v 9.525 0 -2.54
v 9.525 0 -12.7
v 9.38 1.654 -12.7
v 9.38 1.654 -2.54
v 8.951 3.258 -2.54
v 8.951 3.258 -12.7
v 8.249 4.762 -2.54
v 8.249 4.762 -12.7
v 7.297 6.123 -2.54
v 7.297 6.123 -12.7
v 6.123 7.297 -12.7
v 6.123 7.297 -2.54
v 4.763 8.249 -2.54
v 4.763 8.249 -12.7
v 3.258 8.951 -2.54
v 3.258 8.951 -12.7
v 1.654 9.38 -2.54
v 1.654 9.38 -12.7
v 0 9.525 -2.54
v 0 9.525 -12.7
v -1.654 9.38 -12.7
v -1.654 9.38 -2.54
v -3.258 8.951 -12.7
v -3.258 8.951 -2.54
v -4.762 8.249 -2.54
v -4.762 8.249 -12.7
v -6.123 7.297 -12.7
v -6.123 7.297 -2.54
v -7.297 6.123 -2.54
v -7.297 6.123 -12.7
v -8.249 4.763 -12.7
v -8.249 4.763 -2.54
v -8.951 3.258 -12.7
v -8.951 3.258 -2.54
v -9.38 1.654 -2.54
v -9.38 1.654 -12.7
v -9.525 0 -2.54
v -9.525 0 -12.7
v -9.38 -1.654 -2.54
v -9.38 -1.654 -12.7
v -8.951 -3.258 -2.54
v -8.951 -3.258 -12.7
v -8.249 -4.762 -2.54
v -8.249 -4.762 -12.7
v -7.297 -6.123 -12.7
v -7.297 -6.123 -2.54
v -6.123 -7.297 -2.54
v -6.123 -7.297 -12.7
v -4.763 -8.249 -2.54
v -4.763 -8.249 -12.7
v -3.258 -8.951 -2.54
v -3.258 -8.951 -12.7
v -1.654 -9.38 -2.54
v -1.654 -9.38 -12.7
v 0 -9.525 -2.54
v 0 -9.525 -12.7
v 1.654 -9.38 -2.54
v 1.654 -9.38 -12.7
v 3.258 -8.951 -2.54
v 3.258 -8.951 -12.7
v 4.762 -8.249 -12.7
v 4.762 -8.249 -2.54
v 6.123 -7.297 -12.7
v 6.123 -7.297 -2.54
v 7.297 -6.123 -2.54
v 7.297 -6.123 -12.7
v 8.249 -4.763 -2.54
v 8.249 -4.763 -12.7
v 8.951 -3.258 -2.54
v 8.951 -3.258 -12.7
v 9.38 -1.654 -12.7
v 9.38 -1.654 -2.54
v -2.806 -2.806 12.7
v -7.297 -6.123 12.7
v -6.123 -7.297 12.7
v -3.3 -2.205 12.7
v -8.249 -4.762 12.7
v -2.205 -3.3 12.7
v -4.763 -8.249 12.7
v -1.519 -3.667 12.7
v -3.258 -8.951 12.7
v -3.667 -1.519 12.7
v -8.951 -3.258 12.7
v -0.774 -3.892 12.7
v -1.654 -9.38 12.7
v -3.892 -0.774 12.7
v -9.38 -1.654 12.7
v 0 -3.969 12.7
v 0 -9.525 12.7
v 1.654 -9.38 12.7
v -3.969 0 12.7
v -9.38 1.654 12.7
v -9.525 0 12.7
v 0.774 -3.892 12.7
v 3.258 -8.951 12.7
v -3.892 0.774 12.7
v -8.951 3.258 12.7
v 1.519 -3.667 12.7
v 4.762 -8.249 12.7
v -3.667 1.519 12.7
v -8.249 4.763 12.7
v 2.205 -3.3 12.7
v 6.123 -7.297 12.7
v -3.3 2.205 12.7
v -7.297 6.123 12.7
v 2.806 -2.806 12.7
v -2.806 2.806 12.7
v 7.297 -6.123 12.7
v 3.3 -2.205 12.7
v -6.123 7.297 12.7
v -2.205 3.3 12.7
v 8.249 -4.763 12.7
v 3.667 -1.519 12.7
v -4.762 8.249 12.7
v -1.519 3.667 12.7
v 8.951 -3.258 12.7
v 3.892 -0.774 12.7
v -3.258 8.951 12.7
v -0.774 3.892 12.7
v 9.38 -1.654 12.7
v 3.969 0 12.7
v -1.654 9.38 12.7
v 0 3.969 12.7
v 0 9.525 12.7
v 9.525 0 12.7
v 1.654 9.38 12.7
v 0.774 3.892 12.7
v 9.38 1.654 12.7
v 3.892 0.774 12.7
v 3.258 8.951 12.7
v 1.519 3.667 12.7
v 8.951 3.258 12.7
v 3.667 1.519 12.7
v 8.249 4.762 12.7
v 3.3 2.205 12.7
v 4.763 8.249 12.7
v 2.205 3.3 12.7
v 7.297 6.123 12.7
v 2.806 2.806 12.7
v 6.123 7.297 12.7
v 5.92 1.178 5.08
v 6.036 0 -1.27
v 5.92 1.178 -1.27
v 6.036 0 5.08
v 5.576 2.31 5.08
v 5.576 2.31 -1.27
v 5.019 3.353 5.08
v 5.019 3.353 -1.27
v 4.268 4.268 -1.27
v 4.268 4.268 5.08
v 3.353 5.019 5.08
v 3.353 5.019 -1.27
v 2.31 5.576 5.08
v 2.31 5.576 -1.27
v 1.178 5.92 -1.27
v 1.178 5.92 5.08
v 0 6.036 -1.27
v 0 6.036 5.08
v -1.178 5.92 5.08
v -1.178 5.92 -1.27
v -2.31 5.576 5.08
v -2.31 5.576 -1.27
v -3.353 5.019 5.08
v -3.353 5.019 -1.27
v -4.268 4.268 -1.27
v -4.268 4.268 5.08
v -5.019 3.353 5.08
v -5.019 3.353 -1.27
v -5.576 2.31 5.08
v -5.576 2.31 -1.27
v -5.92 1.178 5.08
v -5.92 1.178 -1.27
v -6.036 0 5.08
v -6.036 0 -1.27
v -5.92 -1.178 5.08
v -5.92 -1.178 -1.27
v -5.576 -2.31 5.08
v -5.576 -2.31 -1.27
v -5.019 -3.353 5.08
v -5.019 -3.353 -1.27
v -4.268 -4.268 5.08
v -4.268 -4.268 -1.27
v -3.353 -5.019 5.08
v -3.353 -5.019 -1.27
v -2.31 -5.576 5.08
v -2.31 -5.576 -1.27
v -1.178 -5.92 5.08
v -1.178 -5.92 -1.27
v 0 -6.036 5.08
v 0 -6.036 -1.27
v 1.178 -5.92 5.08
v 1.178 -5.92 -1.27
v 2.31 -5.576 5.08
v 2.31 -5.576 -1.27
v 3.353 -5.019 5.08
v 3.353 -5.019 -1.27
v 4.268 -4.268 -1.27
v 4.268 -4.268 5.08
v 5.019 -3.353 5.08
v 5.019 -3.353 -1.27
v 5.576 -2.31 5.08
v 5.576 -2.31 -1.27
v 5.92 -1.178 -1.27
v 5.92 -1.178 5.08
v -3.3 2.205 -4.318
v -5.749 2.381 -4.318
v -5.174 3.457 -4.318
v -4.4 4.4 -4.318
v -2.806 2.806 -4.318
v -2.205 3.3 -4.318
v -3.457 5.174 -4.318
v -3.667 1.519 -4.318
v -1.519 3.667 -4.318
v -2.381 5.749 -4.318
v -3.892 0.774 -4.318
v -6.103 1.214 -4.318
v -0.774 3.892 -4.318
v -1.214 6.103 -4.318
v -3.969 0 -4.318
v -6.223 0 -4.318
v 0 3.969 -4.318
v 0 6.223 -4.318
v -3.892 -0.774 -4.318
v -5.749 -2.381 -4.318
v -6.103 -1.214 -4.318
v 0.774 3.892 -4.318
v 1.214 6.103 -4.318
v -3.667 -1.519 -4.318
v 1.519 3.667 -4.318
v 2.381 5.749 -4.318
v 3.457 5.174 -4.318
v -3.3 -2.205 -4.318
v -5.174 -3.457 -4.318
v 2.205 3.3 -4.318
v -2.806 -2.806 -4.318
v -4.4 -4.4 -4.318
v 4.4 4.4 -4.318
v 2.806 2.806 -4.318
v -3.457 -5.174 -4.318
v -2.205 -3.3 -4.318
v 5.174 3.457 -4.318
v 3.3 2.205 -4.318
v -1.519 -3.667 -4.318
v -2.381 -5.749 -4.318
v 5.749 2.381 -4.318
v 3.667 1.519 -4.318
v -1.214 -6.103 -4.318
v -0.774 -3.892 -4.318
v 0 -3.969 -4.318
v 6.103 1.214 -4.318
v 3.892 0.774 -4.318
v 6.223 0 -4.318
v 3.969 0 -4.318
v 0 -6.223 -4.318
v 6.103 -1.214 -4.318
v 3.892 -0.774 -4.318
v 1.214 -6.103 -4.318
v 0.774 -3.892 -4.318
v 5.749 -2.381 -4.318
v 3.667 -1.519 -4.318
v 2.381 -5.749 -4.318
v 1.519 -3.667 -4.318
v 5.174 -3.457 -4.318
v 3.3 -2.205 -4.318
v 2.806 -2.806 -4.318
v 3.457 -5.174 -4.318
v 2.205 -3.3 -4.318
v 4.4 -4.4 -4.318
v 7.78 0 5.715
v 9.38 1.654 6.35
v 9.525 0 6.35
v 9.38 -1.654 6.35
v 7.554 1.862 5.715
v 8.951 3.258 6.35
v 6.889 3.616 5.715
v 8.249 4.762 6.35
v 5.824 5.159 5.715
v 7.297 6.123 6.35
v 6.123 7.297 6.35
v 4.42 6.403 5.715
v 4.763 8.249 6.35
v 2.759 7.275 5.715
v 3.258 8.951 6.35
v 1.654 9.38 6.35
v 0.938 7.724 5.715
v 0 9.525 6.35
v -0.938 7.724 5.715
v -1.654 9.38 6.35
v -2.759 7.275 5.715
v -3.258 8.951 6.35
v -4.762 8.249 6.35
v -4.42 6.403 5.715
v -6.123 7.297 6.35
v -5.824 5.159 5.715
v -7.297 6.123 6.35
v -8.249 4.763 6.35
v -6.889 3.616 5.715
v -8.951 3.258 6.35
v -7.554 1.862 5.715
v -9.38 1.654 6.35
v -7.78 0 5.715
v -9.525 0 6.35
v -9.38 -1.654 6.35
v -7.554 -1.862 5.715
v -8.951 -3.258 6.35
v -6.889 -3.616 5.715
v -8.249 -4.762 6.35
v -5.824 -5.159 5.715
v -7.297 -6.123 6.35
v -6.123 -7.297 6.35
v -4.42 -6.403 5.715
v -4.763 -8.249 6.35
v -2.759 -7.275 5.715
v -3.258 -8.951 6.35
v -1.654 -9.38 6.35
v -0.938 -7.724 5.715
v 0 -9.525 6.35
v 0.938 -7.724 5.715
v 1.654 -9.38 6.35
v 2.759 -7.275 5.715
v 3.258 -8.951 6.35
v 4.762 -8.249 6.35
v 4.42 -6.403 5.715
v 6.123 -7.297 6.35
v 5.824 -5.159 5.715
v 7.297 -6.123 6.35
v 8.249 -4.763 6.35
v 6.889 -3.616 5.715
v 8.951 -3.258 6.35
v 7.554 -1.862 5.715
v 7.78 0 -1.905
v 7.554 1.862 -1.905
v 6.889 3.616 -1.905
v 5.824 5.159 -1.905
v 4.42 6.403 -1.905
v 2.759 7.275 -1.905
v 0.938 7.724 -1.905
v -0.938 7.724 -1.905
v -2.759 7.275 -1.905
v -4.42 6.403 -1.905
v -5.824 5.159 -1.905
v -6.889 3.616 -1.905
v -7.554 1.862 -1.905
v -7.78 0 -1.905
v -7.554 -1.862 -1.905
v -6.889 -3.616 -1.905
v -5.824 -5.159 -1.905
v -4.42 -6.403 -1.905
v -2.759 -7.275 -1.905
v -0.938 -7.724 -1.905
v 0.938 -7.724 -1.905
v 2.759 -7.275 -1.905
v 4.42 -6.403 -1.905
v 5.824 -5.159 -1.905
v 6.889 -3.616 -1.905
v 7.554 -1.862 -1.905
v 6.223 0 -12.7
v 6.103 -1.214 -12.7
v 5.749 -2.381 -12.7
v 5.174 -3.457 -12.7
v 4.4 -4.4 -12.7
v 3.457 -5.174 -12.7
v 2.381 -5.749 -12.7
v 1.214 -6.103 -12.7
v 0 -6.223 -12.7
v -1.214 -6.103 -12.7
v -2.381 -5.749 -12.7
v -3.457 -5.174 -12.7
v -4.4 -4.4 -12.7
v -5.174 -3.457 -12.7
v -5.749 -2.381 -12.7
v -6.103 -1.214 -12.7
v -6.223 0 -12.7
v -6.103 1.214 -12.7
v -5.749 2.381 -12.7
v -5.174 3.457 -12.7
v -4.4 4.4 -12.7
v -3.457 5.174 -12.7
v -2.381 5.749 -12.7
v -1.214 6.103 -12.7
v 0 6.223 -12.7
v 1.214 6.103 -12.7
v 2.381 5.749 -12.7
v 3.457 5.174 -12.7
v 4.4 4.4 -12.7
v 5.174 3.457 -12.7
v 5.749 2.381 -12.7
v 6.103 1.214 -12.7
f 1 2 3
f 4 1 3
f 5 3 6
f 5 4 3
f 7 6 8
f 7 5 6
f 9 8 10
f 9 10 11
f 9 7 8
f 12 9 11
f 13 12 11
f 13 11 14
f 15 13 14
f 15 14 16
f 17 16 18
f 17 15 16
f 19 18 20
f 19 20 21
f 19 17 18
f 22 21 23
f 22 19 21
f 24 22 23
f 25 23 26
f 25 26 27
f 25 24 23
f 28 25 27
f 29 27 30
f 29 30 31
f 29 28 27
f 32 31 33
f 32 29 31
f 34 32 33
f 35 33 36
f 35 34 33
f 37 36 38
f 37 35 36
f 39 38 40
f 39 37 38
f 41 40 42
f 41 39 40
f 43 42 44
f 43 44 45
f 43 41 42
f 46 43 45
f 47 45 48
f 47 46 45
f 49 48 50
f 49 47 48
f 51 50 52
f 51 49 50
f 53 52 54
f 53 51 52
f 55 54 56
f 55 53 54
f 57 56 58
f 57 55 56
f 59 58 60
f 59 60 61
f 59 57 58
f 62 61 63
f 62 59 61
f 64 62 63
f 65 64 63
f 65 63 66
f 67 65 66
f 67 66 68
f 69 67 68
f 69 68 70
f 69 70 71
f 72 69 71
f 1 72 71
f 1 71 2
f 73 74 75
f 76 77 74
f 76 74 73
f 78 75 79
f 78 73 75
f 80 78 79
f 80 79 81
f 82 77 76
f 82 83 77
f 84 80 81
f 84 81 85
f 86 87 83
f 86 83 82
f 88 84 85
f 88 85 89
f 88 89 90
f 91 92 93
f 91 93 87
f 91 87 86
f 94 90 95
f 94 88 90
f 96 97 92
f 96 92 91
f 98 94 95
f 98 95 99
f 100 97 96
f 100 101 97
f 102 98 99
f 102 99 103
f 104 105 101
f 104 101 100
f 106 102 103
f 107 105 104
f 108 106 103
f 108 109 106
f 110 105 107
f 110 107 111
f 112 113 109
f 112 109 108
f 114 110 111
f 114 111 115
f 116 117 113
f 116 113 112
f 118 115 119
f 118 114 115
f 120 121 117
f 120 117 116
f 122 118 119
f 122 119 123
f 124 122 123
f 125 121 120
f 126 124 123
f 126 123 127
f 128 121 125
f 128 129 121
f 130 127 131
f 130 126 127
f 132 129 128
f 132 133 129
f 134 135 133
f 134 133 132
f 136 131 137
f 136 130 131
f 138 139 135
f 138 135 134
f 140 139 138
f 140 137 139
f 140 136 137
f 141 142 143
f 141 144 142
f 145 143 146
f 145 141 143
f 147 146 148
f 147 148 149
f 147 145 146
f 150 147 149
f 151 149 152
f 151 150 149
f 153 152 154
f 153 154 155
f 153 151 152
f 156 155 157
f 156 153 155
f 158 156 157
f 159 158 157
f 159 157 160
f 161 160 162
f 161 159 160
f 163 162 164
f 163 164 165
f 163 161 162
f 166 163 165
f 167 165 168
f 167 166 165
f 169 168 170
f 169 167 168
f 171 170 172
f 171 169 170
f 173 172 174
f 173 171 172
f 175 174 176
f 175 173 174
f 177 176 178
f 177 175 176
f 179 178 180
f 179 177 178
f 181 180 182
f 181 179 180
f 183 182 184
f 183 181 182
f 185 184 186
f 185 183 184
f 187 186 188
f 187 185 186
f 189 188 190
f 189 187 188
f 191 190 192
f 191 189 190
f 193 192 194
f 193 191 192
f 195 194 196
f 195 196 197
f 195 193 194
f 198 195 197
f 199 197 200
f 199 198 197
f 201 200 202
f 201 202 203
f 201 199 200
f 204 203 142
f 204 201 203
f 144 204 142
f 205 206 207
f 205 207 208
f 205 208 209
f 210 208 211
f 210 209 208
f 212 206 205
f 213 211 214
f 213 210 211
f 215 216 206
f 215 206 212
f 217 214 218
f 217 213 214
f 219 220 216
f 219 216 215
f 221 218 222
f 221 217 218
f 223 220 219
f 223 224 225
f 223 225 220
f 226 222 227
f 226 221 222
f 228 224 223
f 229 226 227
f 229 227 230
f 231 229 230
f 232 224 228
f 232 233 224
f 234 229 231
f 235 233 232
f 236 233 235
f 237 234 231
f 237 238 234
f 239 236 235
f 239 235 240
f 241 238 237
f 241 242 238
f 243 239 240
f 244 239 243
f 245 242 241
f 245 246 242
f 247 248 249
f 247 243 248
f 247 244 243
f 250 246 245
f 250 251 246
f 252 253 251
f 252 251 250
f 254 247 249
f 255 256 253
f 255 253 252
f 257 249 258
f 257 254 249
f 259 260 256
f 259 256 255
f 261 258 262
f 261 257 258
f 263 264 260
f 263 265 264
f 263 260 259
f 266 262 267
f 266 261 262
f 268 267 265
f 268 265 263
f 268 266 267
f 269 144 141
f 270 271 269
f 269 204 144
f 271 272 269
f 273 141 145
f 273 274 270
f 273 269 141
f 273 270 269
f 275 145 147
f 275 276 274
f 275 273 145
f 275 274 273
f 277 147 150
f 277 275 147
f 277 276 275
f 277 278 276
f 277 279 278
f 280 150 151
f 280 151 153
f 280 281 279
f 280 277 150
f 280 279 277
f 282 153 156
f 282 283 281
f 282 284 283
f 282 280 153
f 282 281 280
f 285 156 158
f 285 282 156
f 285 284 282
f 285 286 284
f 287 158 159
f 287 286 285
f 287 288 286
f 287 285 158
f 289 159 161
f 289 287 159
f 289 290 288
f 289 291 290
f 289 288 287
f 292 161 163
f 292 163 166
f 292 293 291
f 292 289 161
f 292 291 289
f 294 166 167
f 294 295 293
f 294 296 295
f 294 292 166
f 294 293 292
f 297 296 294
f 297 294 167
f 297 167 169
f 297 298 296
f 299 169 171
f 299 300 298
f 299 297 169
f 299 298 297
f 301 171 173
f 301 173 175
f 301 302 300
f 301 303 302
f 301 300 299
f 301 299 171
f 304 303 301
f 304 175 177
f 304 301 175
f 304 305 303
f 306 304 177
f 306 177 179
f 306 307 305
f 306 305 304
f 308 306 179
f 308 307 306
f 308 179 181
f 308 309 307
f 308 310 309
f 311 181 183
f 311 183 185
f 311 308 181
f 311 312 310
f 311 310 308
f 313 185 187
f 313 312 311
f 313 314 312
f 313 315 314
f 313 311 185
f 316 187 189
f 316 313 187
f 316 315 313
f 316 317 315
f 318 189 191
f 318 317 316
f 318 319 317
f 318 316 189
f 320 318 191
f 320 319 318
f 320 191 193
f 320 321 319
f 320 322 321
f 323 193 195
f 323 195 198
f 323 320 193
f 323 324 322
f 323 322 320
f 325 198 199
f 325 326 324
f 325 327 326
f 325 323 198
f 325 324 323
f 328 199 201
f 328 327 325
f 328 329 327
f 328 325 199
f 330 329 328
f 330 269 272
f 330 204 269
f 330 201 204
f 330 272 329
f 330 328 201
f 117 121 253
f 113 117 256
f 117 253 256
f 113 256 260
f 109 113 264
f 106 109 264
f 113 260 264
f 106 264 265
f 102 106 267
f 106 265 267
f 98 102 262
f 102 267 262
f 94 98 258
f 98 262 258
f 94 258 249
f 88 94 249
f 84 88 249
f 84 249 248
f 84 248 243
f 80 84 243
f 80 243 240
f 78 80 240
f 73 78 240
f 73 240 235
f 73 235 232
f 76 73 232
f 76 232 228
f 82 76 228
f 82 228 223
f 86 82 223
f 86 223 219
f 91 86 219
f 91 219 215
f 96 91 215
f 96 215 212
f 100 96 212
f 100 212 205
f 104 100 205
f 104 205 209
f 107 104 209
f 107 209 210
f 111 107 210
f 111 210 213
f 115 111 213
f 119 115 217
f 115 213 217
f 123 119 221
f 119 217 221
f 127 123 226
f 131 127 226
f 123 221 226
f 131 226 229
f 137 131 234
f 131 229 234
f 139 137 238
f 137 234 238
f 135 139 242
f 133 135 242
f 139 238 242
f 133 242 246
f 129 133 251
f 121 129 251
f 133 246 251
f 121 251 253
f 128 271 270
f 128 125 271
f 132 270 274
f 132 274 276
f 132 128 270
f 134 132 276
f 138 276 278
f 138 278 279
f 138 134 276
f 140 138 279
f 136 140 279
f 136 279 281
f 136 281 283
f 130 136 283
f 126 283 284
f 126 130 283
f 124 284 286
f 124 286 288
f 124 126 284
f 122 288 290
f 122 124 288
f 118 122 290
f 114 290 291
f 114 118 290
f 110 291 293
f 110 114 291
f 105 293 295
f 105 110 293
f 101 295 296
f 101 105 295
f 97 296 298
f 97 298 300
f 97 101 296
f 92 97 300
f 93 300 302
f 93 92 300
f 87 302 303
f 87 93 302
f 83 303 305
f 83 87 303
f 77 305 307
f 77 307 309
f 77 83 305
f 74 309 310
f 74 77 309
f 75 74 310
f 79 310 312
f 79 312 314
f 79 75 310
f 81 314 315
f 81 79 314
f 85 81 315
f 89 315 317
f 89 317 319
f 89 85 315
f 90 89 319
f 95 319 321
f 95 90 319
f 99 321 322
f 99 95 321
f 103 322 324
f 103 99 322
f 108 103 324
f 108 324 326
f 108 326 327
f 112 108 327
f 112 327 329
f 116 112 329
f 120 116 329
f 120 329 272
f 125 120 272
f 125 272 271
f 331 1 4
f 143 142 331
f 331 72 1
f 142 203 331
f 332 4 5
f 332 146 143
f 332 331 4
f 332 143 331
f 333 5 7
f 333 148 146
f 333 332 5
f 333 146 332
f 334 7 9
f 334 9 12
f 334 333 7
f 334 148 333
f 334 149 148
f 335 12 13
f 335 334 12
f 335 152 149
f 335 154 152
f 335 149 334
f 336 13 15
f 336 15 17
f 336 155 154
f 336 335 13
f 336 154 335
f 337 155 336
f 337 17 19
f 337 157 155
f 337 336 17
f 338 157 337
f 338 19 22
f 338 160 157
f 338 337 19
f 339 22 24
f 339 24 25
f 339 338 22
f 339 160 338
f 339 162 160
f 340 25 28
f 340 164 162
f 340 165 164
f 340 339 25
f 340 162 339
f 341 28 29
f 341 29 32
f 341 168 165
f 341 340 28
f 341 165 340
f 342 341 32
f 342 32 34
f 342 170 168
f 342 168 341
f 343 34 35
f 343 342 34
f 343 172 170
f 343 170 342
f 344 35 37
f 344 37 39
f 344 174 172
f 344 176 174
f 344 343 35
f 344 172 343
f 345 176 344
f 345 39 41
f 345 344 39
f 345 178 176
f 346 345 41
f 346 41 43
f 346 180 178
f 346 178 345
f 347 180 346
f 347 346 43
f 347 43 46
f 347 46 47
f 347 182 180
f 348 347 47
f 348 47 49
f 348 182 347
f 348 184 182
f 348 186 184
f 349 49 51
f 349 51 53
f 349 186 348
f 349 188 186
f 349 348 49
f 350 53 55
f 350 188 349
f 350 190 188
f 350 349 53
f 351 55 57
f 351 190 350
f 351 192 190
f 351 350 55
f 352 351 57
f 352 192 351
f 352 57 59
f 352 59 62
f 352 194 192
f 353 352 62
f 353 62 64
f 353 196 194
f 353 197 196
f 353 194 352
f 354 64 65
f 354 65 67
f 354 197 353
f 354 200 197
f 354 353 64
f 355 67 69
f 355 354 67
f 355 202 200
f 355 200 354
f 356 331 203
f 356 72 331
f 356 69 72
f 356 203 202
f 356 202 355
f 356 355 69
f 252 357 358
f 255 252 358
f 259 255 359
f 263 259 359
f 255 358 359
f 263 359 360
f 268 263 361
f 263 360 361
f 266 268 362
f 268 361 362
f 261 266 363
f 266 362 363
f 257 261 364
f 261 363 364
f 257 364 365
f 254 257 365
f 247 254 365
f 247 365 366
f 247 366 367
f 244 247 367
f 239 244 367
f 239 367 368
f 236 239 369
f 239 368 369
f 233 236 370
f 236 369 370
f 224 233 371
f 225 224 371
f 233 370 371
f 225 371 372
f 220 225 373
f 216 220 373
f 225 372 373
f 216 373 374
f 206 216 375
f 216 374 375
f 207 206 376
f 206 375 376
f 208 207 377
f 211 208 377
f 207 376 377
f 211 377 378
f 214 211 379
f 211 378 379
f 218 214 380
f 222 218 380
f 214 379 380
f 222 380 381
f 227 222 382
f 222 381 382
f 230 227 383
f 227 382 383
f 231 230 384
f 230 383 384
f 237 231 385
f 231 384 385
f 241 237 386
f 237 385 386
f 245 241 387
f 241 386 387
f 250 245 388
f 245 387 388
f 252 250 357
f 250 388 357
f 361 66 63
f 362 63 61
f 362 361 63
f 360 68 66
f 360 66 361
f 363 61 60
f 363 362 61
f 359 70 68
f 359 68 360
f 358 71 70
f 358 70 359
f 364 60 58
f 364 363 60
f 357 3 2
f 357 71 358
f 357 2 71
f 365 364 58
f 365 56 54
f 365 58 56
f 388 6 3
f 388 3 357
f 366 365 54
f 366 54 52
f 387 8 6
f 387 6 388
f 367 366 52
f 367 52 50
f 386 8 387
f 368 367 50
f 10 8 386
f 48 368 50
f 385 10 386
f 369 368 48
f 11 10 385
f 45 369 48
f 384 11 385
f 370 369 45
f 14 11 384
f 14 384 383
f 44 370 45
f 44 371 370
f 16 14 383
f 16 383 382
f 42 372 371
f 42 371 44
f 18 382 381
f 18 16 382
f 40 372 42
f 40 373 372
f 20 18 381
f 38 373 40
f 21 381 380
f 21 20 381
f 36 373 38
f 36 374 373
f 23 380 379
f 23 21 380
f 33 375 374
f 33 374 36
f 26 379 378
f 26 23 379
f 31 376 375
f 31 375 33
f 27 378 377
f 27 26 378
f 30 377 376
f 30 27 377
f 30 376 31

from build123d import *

# Parameters (mm, degrees)
F2_R     = 3.96875
F3_DEPTH = 25.401
F4_R     = 6.223
F4_R_2   = 3.96875
F5_DEPTH = 8.382


# Not quite as in the source:
# - a feature names something its author has since deleted; it is built from what else it names


with BuildPart() as f1:
    # F0 (on Front) → F1 (revolve)
    with BuildSketch(Plane.XZ):
        Polygon((0, 12.7), (0, 0), (0, -12.7), (9.525, -12.7), (9.525, -2.54), (6.0357036773, -1.27), (6.0357036773, 5.08), (9.525, 6.35), (9.525, 12.7), align=None)
    revolve(axis=Axis((0, 0, 2.3044683039), (0, 0, 1)))

    # F2 (on face) → F3 (cut, through all)
    with BuildSketch(Plane(origin=(0, 0, -12.7), x_dir=(1, 0, 0), z_dir=(0, 0, -1))):
        Circle(F2_R)
    extrude(amount=-F3_DEPTH, mode=Mode.SUBTRACT)

    # F4 (on face) → F5 (cut)
    with BuildSketch(Plane(origin=(0, 0, -12.7), x_dir=(1, 0, 0), z_dir=(0, 0, -1))):
        Circle(F4_R)
        Circle(F4_R_2, mode=Mode.SUBTRACT)
    extrude(amount=-F5_DEPTH, mode=Mode.SUBTRACT)


solid = f1.part
